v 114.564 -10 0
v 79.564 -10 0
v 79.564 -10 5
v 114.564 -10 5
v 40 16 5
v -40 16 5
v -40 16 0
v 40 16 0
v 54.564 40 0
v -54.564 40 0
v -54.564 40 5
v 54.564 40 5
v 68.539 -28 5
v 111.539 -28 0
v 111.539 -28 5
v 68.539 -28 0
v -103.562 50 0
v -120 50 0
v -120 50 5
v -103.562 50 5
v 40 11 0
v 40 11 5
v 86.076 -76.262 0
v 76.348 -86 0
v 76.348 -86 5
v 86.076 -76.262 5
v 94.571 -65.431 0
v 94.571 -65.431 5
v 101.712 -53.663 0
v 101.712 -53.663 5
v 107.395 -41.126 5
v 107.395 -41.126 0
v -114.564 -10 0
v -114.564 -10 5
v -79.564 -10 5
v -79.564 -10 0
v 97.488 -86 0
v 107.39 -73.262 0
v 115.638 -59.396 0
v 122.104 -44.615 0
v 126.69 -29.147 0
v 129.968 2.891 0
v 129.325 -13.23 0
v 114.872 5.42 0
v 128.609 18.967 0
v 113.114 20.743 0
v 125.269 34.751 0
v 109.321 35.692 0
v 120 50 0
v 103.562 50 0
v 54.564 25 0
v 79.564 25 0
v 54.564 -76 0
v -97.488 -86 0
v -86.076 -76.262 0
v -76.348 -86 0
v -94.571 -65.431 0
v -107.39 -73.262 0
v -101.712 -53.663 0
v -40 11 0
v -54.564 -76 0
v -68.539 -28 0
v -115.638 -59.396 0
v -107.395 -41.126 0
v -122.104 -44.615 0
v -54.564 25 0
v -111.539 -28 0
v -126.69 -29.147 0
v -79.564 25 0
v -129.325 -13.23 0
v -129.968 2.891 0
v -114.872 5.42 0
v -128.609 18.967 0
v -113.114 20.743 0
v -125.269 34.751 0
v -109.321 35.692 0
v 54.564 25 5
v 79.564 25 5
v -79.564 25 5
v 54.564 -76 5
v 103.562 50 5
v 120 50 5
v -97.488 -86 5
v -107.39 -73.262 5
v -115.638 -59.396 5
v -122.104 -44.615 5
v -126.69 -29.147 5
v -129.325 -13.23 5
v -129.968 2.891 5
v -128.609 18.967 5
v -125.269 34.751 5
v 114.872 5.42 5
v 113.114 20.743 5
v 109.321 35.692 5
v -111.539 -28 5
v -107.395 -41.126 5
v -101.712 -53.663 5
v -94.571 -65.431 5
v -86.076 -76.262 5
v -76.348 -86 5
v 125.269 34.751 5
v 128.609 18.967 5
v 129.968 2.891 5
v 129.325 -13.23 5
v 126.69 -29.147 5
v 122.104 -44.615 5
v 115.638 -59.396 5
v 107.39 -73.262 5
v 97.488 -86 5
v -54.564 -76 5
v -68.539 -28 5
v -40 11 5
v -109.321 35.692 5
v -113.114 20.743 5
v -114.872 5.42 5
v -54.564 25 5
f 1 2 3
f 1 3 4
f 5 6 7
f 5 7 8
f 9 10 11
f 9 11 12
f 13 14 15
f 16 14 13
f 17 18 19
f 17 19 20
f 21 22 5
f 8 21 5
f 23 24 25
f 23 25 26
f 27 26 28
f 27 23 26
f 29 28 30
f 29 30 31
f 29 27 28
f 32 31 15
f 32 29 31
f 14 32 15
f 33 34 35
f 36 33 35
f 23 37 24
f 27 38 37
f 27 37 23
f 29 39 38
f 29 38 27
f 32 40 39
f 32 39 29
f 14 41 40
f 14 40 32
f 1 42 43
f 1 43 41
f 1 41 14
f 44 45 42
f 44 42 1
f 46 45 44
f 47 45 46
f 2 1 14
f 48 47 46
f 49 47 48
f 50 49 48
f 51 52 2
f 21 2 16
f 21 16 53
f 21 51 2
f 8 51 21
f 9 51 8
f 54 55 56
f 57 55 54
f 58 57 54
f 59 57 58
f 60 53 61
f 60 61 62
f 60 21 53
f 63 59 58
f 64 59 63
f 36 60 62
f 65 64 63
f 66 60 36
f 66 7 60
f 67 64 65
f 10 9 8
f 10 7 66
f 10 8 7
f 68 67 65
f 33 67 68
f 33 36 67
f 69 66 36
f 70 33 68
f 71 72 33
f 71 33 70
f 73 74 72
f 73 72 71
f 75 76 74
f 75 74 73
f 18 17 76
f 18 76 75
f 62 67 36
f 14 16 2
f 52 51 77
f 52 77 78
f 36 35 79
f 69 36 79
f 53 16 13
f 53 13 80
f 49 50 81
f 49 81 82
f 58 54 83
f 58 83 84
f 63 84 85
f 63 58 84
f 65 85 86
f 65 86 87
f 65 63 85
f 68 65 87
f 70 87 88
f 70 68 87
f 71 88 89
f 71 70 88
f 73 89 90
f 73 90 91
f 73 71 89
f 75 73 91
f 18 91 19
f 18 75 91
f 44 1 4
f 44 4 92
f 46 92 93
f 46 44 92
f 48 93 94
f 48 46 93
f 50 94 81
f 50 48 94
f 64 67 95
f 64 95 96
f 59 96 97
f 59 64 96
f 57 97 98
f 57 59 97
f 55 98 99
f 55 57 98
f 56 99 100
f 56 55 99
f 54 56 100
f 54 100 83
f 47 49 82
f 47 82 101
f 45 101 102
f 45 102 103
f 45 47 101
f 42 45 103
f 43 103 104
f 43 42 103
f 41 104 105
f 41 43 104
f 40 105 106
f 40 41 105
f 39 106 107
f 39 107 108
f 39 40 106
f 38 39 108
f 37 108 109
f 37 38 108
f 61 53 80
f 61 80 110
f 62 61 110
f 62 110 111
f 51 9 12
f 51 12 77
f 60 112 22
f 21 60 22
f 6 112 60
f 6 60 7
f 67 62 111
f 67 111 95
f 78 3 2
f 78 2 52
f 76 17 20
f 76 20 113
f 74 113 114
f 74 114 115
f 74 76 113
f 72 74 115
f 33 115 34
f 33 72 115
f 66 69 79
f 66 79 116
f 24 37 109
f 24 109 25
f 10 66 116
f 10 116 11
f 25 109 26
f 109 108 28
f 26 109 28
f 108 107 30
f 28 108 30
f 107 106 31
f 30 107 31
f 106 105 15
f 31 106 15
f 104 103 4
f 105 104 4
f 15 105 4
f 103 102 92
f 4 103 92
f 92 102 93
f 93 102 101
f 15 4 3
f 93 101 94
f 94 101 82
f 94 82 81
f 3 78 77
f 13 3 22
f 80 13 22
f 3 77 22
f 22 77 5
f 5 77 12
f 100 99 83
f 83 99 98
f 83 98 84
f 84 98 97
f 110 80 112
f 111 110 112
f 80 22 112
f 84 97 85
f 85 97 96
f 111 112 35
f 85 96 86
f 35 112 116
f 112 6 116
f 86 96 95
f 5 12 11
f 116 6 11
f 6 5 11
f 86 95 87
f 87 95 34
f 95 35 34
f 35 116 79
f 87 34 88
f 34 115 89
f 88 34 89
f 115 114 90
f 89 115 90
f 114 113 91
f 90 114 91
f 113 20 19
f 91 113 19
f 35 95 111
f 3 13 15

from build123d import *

# Parameters (mm, degrees)
BOSS_EXTRU_1_DEPTH      = 5
ENL_V_MAT_EXTRU_1_DEPTH = 156.951915666
ENL_V_MAT_EXTRU_2_DEPTH = 156.951915666
ESQUISSE7_W             = 10
ESQUISSE7_H             = 42.449970018
ENL_V_MAT_EXTRU_5_DEPTH = 156.951915666
ESQUISSE8_W             = 80
ESQUISSE8_H             = 5
ENL_V_MAT_EXTRU_8_DEPTH = 5


with BuildPart() as part:
    # Esquisse1 → Boss.-Extru.1 (new body)
    with BuildSketch(Plane.XY):
        with BuildLine():
            ThreePointArc((-111.539230767, -28), (-98.317812976, -59.654066514), (-76.347887987, -86))
            Line((-76.347887987, -86), (-97.488460856, -86))
            ThreePointArc((-97.488460856, -86), (-128.254854299, -21.229515978), (-120, 50))
            Line((-120, 50), (-103.561575886, 50))
            ThreePointArc((-103.561575886, 50), (-113.113812186, 20.742841962), (-114.564392374, -10))
            Line((-114.564392374, -10), (-89.564392374, -10))
            Line((-89.564392374, -10), (-89.564392374, 25))
            Line((-89.564392374, 25), (-54.564392374, 25))
            Line((-54.564392374, 25), (-54.564392374, 40))
            Line((-54.564392374, 40), (54.564392374, 40))
            Line((54.564392374, 40), (54.564392374, 25))
            Line((54.564392374, 25), (89.564392374, 25))
            Line((89.564392374, 25), (89.564392374, -10))
            Line((89.564392374, -10), (114.564392374, -10))
            ThreePointArc((114.564392374, -10), (113.113812186, 20.742841962), (103.561575886, 50))
            Line((103.561575886, 50), (120, 50))
            ThreePointArc((120, 50), (128.254854299, -21.229515978), (97.488460856, -86))
            Line((97.488460856, -86), (76.347887987, -86))
            ThreePointArc((76.347887987, -86), (98.317812976, -59.654066514), (111.539230767, -28))
            Line((111.539230767, -28), (68.539230767, -28))
            Line((68.539230767, -28), (54.564392374, -76))
            Line((54.564392374, -76), (-54.564392374, -76))
            Line((-54.564392374, -76), (-68.539230767, -28))
            Line((-68.539230767, -28), (-111.539230767, -28))
        make_face()
    extrude(amount=BOSS_EXTRU_1_DEPTH)

    # Esquisse3 → Enlèv. mat.-Extru.1 (cut, through all)
    with BuildSketch(Plane.XY.offset(5)):
        with BuildLine():
            Line((89.564392374, 25), (79.564392374, 25))
            ThreePointArc((79.564392374, 25), (86.635460186, 22.071067812), (89.564392374, 15))
            Line((89.564392374, 15), (89.564392374, 25))
        make_face()
    extrude(amount=-ENL_V_MAT_EXTRU_1_DEPTH, mode=Mode.SUBTRACT)

    # Esquisse6 → Enlèv. mat.-Extru.2 (cut, through all)
    with BuildSketch(Plane.XY.offset(5)):
        with BuildLine():
            ThreePointArc((-89.564392374, 15), (-86.635460186, 22.071067812), (-79.564392374, 25))
            Line((-79.564392374, 25), (-89.564392374, 25))
            Line((-89.564392374, 25), (-89.564392374, 15))
        make_face()
    extrude(amount=-ENL_V_MAT_EXTRU_2_DEPTH, mode=Mode.SUBTRACT)

    # Esquisse7 → Enlèv. mat.-Extru.5 (cut, through all)
    with BuildSketch(Plane.XY.offset(5)):
        with Locations((-84.564392374, 11.224985009)):
            Rectangle(ESQUISSE7_W, ESQUISSE7_H)
        with Locations((84.564392374, 11.224985009)):
            Rectangle(ESQUISSE7_W, ESQUISSE7_H)
    extrude(amount=-ENL_V_MAT_EXTRU_5_DEPTH, mode=Mode.SUBTRACT)

    # Esquisse8 → Enlèv. mat.-Extru.8 (cut)
    with BuildSketch(Plane.XY.offset(5)):
        with Locations((0, 13.5)):
            Rectangle(ESQUISSE8_W, ESQUISSE8_H)
    extrude(amount=-ENL_V_MAT_EXTRU_8_DEPTH, mode=Mode.SUBTRACT)


solid = part.part
